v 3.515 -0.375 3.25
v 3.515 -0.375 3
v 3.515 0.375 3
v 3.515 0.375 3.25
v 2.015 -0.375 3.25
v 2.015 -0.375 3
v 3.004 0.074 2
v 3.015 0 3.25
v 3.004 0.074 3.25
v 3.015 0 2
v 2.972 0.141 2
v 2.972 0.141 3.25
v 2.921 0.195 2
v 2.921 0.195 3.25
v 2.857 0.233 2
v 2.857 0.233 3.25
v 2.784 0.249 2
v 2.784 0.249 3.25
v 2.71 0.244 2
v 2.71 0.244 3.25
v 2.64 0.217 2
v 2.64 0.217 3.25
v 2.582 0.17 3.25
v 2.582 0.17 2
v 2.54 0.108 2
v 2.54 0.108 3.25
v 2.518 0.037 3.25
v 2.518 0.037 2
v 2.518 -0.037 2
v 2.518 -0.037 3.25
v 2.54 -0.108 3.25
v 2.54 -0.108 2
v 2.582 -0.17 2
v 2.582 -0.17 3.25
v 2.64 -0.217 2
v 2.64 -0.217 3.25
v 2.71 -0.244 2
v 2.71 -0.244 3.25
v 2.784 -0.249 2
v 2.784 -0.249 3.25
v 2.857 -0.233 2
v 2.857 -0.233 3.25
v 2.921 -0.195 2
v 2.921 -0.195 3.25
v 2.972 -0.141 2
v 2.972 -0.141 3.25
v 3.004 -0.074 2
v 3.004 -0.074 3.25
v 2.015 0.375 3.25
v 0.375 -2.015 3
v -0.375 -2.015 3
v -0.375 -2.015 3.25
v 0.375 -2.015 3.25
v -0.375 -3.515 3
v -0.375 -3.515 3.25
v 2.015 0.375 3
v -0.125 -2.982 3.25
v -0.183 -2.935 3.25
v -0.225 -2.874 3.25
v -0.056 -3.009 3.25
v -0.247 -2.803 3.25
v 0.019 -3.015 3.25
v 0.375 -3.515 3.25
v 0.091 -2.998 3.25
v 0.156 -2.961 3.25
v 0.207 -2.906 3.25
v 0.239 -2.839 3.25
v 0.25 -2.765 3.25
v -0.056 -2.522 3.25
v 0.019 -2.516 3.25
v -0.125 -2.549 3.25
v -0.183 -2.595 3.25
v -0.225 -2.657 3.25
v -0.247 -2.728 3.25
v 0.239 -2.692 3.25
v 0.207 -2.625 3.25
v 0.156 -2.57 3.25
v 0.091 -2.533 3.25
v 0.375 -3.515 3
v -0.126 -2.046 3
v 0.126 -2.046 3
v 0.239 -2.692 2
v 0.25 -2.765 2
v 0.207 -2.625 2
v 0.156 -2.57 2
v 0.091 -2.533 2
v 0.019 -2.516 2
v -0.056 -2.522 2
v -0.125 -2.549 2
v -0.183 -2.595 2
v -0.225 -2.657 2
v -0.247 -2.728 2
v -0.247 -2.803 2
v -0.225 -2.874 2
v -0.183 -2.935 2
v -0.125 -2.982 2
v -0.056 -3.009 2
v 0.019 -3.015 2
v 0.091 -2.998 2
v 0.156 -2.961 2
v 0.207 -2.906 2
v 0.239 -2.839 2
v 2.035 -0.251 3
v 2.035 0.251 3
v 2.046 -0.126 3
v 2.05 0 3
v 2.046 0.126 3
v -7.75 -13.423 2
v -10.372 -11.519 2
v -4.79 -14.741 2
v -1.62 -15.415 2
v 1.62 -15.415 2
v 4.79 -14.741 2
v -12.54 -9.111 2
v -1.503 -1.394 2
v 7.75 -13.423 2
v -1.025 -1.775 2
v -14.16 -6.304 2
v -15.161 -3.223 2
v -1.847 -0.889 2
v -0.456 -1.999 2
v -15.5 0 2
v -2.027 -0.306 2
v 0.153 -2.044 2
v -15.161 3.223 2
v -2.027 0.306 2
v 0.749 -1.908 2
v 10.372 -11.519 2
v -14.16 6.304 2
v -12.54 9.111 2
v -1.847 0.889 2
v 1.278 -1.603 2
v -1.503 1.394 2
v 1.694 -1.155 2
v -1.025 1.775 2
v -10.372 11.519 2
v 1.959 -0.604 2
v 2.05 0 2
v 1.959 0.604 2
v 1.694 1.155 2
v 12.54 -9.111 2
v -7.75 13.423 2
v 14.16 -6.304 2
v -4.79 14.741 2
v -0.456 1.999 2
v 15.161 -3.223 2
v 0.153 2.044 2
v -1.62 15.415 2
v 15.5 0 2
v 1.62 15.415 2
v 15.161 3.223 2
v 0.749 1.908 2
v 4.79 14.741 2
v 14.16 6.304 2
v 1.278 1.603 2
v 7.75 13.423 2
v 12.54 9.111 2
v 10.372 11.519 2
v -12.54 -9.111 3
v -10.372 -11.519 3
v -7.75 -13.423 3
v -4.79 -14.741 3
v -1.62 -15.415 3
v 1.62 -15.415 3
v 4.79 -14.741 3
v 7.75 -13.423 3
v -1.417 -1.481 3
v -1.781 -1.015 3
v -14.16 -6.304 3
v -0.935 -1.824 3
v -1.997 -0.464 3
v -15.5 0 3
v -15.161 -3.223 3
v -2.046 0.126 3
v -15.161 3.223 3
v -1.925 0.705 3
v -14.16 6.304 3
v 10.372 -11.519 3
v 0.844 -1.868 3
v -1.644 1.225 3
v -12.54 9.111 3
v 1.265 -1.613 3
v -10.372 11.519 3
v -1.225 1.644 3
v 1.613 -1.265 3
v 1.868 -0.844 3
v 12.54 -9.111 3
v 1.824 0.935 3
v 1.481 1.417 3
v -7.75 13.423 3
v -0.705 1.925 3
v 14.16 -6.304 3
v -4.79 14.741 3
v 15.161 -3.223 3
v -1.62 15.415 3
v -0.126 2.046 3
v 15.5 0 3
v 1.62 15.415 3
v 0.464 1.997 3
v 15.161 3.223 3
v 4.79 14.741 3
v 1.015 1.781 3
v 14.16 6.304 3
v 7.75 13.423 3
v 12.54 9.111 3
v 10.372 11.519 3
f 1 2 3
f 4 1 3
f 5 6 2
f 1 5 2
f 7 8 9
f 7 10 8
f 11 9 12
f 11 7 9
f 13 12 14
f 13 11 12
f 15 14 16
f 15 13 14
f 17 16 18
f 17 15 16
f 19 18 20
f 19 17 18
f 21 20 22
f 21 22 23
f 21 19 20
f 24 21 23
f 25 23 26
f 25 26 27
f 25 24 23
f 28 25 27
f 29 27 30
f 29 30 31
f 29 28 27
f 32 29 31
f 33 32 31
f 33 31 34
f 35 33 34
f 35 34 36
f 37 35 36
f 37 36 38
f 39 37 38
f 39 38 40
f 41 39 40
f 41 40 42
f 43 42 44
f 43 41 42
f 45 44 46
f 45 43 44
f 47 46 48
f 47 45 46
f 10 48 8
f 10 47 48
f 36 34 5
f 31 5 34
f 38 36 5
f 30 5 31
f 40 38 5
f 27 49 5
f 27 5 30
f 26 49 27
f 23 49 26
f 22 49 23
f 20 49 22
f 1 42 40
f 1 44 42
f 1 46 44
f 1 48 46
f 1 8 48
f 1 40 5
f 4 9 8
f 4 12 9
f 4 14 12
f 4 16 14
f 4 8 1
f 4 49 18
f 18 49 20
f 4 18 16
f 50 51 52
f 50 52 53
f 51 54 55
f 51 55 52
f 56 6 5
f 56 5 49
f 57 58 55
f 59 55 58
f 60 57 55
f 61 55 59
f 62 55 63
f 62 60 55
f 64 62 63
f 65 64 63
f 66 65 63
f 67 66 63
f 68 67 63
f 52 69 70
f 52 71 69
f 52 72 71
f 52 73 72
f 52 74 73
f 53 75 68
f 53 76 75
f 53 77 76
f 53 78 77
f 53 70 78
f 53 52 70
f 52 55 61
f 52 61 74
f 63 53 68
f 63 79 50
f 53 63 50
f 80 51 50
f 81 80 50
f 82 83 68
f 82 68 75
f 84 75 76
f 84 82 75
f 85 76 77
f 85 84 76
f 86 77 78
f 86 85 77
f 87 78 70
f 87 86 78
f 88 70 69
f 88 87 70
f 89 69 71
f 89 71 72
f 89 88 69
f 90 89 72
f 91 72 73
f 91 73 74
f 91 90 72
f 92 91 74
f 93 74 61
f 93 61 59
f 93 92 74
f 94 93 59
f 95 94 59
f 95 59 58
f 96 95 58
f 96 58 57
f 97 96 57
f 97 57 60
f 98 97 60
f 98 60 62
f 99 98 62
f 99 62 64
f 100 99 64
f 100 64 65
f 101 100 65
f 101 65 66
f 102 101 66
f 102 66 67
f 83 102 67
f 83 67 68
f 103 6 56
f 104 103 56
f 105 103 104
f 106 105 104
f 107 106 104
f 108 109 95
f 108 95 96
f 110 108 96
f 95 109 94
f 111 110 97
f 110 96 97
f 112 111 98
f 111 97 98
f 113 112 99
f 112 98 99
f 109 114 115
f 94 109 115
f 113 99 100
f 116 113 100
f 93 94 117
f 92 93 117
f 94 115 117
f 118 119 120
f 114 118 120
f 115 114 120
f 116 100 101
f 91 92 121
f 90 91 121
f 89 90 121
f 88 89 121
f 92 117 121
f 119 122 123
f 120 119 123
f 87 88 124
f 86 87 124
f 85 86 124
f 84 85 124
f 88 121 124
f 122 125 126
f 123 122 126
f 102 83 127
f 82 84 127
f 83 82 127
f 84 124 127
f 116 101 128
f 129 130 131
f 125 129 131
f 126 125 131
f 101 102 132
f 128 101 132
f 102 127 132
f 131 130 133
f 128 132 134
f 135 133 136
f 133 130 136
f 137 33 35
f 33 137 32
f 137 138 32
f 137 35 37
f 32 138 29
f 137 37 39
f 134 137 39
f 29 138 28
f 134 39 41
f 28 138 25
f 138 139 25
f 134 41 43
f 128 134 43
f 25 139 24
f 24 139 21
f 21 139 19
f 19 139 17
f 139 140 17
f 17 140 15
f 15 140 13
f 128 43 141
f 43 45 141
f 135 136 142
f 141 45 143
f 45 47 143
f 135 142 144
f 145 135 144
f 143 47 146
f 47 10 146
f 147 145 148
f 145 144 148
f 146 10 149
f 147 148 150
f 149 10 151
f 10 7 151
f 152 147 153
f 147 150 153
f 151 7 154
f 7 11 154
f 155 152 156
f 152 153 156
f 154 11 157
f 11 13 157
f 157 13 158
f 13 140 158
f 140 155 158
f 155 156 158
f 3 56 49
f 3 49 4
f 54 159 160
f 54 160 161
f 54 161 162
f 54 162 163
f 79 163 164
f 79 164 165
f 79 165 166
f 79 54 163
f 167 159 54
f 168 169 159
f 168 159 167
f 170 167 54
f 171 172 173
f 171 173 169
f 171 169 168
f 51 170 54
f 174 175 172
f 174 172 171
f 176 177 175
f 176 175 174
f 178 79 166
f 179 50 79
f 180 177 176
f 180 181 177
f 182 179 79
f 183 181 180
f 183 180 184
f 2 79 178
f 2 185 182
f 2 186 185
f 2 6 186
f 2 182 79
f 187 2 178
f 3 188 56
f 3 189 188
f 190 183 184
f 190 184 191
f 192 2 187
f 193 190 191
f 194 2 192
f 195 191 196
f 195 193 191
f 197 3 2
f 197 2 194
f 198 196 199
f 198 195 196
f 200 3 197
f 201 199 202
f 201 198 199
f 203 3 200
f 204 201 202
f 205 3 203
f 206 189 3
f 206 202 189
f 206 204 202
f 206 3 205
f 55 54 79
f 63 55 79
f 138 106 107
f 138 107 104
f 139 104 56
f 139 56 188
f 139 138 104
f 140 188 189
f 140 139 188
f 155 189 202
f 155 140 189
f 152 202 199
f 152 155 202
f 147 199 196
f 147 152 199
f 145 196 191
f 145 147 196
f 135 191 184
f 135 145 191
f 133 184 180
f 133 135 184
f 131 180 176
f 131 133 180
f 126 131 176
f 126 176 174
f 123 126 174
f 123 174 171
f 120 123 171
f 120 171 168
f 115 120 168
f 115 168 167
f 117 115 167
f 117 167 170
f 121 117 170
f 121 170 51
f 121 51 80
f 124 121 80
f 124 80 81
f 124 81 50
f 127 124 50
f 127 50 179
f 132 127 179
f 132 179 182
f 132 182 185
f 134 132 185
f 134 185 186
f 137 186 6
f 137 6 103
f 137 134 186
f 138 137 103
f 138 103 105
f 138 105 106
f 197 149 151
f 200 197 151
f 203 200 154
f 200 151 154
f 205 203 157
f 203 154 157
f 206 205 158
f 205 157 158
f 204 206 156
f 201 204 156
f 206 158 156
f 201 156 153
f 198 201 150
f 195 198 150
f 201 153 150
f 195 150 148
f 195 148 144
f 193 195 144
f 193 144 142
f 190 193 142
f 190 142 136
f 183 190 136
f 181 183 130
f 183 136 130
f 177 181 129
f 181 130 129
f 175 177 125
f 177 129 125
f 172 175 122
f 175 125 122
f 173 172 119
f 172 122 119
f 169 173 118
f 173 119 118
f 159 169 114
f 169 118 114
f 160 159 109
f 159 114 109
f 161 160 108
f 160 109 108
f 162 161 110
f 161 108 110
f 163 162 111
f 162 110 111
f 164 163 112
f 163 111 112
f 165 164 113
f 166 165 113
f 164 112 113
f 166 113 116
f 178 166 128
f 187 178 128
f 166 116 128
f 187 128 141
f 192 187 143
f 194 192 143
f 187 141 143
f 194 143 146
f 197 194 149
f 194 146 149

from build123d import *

# Parameters (mm, degrees)
IZIM2_R                     = 15.5
IZIM2_R_2                   = 2.05
Y_KSEKLIK_EKSTR_ZYON1_DEPTH = 1
IZIM3_W                     = 1.5
IZIM3_H                     = 0.75
IZIM3_R                     = 0.25
IZIM3_W_2                   = 0.75
IZIM3_H_2                   = 1.5
Y_KSEKLIK_EKSTR_ZYON2_DEPTH = 0.25
KES_EKSTR_ZYON1_DEPTH       = 22.943108257
KES_EKSTR_ZYON1_DEPTH_BACK  = 22.943108257
IZIM3_3_R                   = 0.25


with BuildPart() as part:
    # Çizim2 → Yükseklik-Ekstrüzyon1 (new body)
    with BuildSketch(Plane.XY.offset(2)):
        Circle(IZIM2_R)
        Circle(IZIM2_R_2, mode=Mode.SUBTRACT)
    extrude(amount=Y_KSEKLIK_EKSTR_ZYON1_DEPTH)

    # Çizim3 → Yükseklik-Ekstrüzyon2 (add)
    # profile 1 of 2: a face of its own
    with BuildSketch(Plane.XY.offset(3)):
        with Locations((2.765409388, 0)):
            Rectangle(IZIM3_W, IZIM3_H)
        with Locations((2.765409388, 0)):
            Circle(IZIM3_R, mode=Mode.SUBTRACT)
    # profile 2 of 2: a face of its own
    with BuildSketch(Plane.XY.offset(3)):
        with Locations((0, -2.765409388)):
            Rectangle(IZIM3_W_2, IZIM3_H_2)
        with Locations((0, -2.765409388)):
            Circle(IZIM3_R, mode=Mode.SUBTRACT)
    extrude(amount=Y_KSEKLIK_EKSTR_ZYON2_DEPTH)

    # Çizim3<3> → Kes-Ekstrüzyon1 (cut, two sides: drawn at the far end of the back side and taken through both)
    with BuildSketch(Plane.XY.offset(3).offset(-KES_EKSTR_ZYON1_DEPTH_BACK)):
        with Locations((0, -2.765409388)):
            Circle(IZIM3_3_R)
        with Locations((2.765409388, 0)):
            Circle(IZIM3_3_R)
    extrude(amount=KES_EKSTR_ZYON1_DEPTH + KES_EKSTR_ZYON1_DEPTH_BACK, mode=Mode.SUBTRACT)


solid = part.part
